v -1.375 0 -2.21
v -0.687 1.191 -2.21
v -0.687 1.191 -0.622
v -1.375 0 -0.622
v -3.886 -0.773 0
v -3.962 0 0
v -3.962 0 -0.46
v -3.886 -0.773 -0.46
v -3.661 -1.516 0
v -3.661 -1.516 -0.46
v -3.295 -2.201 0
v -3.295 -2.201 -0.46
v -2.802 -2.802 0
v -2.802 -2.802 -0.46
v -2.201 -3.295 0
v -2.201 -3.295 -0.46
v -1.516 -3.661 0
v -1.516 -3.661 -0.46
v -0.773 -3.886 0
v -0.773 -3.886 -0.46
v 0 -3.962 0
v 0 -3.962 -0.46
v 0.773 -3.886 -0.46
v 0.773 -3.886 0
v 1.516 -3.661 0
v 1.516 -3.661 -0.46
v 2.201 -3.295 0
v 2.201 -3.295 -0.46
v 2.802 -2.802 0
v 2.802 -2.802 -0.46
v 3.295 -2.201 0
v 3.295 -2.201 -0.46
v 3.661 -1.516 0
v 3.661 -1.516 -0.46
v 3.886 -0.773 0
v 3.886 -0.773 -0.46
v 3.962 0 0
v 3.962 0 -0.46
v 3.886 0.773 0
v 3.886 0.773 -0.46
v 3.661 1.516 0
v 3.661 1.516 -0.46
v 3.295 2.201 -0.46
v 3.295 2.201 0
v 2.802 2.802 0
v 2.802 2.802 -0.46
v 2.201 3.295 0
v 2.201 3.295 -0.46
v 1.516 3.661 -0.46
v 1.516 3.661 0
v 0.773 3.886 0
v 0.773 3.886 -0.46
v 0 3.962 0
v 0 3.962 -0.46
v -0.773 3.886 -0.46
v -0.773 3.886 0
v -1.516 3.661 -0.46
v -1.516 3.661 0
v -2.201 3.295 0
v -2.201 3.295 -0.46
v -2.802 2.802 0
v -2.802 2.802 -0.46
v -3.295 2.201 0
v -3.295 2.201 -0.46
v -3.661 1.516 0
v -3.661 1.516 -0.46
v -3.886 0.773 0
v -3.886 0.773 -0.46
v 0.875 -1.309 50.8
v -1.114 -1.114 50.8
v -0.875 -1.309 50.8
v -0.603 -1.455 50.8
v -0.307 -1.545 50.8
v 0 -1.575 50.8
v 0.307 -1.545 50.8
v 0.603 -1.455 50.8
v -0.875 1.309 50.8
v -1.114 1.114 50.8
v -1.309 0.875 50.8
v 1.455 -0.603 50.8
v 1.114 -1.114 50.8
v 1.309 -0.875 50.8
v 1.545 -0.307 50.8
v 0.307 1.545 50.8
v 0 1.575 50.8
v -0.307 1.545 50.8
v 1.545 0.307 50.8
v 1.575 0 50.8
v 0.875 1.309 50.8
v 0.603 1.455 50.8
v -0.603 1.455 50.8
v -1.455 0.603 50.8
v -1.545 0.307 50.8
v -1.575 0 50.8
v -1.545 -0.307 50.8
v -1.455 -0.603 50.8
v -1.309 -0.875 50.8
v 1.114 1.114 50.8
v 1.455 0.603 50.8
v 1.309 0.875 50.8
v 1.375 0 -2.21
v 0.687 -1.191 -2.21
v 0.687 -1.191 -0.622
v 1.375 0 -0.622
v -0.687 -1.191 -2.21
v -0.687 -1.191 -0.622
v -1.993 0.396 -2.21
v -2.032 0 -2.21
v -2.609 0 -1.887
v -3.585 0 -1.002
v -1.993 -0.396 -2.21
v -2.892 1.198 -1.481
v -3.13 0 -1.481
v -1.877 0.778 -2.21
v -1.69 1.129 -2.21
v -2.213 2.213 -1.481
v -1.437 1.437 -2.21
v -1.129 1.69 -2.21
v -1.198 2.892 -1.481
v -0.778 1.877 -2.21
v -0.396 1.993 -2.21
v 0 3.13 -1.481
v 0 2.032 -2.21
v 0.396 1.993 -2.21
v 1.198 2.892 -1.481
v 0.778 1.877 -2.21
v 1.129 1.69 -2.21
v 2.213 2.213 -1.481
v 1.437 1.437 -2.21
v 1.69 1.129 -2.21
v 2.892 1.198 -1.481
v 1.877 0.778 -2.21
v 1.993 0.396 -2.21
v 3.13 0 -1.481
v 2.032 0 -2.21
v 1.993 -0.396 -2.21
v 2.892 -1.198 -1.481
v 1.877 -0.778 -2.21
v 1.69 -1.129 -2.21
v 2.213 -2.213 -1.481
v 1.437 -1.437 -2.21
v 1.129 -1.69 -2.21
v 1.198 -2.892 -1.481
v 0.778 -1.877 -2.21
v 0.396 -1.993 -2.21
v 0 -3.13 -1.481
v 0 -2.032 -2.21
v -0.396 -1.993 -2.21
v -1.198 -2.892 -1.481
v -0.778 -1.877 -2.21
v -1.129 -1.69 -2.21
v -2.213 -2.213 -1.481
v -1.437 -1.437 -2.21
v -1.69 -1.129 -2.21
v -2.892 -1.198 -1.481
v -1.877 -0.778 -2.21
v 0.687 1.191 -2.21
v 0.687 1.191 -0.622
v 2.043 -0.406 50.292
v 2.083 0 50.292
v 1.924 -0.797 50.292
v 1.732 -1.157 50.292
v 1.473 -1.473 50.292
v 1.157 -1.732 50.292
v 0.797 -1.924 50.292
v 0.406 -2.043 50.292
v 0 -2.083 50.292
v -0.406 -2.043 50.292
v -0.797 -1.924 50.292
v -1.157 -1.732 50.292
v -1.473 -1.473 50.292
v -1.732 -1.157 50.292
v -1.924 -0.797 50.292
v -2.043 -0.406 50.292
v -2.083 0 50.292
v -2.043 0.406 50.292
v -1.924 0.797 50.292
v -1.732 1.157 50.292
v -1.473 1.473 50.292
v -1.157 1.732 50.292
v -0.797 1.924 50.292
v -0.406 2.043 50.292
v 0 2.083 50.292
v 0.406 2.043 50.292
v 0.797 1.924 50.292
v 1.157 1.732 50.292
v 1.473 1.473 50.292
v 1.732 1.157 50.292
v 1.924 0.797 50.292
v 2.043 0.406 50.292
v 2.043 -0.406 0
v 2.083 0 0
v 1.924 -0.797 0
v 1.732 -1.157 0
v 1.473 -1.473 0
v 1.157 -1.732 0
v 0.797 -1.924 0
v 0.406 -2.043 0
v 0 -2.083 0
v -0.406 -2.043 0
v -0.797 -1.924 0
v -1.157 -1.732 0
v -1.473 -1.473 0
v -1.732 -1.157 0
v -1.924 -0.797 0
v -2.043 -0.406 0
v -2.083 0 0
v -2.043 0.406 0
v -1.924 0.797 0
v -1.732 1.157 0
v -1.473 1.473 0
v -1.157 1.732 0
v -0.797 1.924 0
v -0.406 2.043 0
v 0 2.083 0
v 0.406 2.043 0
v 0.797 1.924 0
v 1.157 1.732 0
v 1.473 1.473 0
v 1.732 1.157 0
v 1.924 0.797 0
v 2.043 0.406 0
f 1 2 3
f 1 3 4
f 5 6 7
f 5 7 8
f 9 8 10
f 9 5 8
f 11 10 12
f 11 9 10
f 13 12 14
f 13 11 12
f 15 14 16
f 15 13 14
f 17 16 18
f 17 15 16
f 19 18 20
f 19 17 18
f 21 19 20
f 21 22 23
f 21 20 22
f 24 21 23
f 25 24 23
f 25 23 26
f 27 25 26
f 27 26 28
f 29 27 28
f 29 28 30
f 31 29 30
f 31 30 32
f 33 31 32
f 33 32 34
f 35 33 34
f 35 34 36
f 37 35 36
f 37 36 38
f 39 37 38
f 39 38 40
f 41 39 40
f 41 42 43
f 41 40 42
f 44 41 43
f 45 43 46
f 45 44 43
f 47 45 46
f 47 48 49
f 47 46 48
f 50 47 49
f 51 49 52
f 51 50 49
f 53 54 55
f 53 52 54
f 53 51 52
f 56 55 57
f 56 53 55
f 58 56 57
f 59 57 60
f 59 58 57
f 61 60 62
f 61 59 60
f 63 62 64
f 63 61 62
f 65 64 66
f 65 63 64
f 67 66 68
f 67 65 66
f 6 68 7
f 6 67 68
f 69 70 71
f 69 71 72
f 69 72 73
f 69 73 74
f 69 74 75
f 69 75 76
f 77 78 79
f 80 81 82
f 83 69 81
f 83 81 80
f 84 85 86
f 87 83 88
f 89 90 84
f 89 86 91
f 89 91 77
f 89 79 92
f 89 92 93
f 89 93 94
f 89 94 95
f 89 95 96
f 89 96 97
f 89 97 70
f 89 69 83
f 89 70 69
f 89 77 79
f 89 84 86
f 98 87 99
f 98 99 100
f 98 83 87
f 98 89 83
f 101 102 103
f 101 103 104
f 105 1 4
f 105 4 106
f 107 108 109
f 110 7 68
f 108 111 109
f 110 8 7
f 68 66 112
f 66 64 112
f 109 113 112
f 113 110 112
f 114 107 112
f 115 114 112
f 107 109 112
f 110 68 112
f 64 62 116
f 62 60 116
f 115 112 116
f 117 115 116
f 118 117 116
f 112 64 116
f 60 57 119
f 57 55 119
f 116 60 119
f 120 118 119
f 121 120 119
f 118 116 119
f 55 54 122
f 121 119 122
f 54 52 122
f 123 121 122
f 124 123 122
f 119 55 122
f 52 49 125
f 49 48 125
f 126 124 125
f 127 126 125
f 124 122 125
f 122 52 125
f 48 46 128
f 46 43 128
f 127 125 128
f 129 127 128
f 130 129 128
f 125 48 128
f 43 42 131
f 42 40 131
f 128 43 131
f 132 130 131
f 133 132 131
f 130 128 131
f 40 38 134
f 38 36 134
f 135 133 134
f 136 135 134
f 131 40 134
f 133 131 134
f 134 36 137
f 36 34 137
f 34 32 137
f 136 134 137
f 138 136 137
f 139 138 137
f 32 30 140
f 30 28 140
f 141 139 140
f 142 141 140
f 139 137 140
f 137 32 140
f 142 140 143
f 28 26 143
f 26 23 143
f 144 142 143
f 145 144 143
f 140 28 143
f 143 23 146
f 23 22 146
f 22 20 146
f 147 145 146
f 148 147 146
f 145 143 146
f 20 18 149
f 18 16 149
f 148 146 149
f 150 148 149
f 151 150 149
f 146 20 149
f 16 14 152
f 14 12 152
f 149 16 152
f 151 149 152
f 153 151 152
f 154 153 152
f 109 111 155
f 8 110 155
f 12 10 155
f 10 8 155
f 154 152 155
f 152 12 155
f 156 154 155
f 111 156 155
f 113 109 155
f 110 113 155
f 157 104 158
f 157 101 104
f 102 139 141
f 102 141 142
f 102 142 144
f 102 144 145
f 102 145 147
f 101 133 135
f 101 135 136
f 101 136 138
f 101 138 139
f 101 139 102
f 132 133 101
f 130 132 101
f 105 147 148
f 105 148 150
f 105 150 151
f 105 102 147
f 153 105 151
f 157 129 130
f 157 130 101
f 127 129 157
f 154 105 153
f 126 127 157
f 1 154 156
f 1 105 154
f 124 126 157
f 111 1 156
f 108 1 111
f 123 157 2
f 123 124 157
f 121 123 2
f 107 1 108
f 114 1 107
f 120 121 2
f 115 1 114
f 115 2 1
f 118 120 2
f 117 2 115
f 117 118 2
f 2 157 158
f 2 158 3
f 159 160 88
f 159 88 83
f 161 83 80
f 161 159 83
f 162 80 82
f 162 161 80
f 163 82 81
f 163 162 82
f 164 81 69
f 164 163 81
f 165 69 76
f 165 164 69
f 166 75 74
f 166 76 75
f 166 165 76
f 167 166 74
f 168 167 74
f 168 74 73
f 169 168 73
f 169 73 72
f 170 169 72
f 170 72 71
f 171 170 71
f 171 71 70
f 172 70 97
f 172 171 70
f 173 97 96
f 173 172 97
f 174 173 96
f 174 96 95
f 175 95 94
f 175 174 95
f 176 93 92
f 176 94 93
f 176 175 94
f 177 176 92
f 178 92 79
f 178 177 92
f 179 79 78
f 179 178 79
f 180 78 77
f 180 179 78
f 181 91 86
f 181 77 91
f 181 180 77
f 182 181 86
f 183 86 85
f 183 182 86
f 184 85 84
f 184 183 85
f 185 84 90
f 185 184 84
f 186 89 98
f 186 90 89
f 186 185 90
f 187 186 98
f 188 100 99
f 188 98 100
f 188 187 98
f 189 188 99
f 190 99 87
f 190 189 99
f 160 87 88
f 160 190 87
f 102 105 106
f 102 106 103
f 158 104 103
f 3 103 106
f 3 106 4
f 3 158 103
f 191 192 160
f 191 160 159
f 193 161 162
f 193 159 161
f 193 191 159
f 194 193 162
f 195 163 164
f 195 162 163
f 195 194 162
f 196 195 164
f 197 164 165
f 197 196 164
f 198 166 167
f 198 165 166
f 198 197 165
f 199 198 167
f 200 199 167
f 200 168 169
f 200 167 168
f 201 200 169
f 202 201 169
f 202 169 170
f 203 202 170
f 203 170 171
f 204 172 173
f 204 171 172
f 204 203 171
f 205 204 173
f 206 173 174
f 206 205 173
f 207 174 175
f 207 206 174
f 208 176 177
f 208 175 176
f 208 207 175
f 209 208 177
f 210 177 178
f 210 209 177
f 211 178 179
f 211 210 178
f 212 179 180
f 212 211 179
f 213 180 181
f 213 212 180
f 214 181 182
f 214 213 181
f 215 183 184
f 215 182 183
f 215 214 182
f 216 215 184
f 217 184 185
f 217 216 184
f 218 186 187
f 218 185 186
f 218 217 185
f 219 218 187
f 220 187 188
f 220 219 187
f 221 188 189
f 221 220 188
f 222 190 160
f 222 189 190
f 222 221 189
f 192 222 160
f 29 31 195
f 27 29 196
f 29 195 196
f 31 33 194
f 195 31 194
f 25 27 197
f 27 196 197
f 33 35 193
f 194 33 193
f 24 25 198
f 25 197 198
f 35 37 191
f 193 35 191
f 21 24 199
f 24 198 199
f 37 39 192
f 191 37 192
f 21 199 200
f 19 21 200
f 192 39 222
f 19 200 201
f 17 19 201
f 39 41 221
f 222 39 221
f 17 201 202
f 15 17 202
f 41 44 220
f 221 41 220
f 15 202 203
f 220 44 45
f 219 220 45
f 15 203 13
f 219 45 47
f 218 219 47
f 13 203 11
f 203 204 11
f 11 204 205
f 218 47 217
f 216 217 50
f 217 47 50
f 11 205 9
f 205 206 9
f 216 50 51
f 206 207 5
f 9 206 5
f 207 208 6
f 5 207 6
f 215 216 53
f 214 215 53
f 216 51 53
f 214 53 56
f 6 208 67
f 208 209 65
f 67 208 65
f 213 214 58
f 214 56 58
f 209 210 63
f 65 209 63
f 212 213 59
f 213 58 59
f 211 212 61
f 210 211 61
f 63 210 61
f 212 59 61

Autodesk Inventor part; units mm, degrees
ref_plane "YZ Plane" through (0, 0, 0) normal (1, 0, 0) x (0, 1, 0)
ref_plane "XZ Plane" through (0, 0, 0) normal (0, 1, 0) x (-1, 0, 0)
ref_plane "XY Plane" through (0, 0, 0) normal (0, 0, 1) x (1, 0, 0)
sketch "Sketch1" plane through (0, 0, 0) normal (0, 0, 1) x (1, 0, 0)
  circle A0 centre (0, 0) radius 2.0828
  dimension "d0" = 4.1656
extrude "Extrusion1" add sketch "Sketch1" along normal blind 50.8
sketch "Sketch2" plane through (0, 0, 0) normal (0, 1, 0) x (-1, 0, 0)
  line L0 (0, 0) -> (0, -2.2098)
  line L1 (0, 0) -> (3.9624, 0)
  line L2 (0, -2.2098) -> (2.032, -2.2098)
  line L3 (3.9624, 0) -> (3.9624, 3.6562) construction
  arc A0 (2.032, -2.2098) -> (3.9624, -0.4599) centre (0.1837, 1.7689) ccw
  line L4 (4.5847, 0.6553) -> (4.5847, -0.2608) construction
  line L5 (3.9624, -0.4599) -> (3.9624, 0)
  dimension "d3" = 2.2098
  dimension "d6" = 2.032
  dimension "d19" = 3.9624
revolve "Revolution1" add sketch "Sketch2" angle 360 about axis through (0, 0, 0) along (0, 0, -1)
sketch "Sketch3" plane through (0, 0, -2.2098) normal (0, 0, -1) x (-1, 0, 0)
  circle A0 centre (0, 0) radius 2.032 projected
  line L0 (-0.6874, 1.1906) -> (0.6874, 1.1906)
  line L1 (0.6874, 1.1906) -> (1.3748, 0)
  line L2 (1.3748, 0) -> (0.6874, -1.1906)
  line L3 (0.6874, -1.1906) -> (-0.6874, -1.1906)
  line L4 (-0.6874, -1.1906) -> (-1.3748, 0)
  line L5 (-1.3748, 0) -> (-0.6874, 1.1906)
  dimension "d8" = 2.3813
extrude "Extrusion2" cut sketch "Sketch3" against normal blind 1.5875 contours L0 L1 L2 L3 L4 L5
chamfer "Chamfer1" distance 0.508 angle 45 1 edges at (-2.0828, 0, 50.8)
thread "Thread1" size "8-32 UNC" class "2A" standard "ANSI Unified Screw Threads" length 25.4
properties part number "10-32 x500 button head" material "Aluminum 6061"
